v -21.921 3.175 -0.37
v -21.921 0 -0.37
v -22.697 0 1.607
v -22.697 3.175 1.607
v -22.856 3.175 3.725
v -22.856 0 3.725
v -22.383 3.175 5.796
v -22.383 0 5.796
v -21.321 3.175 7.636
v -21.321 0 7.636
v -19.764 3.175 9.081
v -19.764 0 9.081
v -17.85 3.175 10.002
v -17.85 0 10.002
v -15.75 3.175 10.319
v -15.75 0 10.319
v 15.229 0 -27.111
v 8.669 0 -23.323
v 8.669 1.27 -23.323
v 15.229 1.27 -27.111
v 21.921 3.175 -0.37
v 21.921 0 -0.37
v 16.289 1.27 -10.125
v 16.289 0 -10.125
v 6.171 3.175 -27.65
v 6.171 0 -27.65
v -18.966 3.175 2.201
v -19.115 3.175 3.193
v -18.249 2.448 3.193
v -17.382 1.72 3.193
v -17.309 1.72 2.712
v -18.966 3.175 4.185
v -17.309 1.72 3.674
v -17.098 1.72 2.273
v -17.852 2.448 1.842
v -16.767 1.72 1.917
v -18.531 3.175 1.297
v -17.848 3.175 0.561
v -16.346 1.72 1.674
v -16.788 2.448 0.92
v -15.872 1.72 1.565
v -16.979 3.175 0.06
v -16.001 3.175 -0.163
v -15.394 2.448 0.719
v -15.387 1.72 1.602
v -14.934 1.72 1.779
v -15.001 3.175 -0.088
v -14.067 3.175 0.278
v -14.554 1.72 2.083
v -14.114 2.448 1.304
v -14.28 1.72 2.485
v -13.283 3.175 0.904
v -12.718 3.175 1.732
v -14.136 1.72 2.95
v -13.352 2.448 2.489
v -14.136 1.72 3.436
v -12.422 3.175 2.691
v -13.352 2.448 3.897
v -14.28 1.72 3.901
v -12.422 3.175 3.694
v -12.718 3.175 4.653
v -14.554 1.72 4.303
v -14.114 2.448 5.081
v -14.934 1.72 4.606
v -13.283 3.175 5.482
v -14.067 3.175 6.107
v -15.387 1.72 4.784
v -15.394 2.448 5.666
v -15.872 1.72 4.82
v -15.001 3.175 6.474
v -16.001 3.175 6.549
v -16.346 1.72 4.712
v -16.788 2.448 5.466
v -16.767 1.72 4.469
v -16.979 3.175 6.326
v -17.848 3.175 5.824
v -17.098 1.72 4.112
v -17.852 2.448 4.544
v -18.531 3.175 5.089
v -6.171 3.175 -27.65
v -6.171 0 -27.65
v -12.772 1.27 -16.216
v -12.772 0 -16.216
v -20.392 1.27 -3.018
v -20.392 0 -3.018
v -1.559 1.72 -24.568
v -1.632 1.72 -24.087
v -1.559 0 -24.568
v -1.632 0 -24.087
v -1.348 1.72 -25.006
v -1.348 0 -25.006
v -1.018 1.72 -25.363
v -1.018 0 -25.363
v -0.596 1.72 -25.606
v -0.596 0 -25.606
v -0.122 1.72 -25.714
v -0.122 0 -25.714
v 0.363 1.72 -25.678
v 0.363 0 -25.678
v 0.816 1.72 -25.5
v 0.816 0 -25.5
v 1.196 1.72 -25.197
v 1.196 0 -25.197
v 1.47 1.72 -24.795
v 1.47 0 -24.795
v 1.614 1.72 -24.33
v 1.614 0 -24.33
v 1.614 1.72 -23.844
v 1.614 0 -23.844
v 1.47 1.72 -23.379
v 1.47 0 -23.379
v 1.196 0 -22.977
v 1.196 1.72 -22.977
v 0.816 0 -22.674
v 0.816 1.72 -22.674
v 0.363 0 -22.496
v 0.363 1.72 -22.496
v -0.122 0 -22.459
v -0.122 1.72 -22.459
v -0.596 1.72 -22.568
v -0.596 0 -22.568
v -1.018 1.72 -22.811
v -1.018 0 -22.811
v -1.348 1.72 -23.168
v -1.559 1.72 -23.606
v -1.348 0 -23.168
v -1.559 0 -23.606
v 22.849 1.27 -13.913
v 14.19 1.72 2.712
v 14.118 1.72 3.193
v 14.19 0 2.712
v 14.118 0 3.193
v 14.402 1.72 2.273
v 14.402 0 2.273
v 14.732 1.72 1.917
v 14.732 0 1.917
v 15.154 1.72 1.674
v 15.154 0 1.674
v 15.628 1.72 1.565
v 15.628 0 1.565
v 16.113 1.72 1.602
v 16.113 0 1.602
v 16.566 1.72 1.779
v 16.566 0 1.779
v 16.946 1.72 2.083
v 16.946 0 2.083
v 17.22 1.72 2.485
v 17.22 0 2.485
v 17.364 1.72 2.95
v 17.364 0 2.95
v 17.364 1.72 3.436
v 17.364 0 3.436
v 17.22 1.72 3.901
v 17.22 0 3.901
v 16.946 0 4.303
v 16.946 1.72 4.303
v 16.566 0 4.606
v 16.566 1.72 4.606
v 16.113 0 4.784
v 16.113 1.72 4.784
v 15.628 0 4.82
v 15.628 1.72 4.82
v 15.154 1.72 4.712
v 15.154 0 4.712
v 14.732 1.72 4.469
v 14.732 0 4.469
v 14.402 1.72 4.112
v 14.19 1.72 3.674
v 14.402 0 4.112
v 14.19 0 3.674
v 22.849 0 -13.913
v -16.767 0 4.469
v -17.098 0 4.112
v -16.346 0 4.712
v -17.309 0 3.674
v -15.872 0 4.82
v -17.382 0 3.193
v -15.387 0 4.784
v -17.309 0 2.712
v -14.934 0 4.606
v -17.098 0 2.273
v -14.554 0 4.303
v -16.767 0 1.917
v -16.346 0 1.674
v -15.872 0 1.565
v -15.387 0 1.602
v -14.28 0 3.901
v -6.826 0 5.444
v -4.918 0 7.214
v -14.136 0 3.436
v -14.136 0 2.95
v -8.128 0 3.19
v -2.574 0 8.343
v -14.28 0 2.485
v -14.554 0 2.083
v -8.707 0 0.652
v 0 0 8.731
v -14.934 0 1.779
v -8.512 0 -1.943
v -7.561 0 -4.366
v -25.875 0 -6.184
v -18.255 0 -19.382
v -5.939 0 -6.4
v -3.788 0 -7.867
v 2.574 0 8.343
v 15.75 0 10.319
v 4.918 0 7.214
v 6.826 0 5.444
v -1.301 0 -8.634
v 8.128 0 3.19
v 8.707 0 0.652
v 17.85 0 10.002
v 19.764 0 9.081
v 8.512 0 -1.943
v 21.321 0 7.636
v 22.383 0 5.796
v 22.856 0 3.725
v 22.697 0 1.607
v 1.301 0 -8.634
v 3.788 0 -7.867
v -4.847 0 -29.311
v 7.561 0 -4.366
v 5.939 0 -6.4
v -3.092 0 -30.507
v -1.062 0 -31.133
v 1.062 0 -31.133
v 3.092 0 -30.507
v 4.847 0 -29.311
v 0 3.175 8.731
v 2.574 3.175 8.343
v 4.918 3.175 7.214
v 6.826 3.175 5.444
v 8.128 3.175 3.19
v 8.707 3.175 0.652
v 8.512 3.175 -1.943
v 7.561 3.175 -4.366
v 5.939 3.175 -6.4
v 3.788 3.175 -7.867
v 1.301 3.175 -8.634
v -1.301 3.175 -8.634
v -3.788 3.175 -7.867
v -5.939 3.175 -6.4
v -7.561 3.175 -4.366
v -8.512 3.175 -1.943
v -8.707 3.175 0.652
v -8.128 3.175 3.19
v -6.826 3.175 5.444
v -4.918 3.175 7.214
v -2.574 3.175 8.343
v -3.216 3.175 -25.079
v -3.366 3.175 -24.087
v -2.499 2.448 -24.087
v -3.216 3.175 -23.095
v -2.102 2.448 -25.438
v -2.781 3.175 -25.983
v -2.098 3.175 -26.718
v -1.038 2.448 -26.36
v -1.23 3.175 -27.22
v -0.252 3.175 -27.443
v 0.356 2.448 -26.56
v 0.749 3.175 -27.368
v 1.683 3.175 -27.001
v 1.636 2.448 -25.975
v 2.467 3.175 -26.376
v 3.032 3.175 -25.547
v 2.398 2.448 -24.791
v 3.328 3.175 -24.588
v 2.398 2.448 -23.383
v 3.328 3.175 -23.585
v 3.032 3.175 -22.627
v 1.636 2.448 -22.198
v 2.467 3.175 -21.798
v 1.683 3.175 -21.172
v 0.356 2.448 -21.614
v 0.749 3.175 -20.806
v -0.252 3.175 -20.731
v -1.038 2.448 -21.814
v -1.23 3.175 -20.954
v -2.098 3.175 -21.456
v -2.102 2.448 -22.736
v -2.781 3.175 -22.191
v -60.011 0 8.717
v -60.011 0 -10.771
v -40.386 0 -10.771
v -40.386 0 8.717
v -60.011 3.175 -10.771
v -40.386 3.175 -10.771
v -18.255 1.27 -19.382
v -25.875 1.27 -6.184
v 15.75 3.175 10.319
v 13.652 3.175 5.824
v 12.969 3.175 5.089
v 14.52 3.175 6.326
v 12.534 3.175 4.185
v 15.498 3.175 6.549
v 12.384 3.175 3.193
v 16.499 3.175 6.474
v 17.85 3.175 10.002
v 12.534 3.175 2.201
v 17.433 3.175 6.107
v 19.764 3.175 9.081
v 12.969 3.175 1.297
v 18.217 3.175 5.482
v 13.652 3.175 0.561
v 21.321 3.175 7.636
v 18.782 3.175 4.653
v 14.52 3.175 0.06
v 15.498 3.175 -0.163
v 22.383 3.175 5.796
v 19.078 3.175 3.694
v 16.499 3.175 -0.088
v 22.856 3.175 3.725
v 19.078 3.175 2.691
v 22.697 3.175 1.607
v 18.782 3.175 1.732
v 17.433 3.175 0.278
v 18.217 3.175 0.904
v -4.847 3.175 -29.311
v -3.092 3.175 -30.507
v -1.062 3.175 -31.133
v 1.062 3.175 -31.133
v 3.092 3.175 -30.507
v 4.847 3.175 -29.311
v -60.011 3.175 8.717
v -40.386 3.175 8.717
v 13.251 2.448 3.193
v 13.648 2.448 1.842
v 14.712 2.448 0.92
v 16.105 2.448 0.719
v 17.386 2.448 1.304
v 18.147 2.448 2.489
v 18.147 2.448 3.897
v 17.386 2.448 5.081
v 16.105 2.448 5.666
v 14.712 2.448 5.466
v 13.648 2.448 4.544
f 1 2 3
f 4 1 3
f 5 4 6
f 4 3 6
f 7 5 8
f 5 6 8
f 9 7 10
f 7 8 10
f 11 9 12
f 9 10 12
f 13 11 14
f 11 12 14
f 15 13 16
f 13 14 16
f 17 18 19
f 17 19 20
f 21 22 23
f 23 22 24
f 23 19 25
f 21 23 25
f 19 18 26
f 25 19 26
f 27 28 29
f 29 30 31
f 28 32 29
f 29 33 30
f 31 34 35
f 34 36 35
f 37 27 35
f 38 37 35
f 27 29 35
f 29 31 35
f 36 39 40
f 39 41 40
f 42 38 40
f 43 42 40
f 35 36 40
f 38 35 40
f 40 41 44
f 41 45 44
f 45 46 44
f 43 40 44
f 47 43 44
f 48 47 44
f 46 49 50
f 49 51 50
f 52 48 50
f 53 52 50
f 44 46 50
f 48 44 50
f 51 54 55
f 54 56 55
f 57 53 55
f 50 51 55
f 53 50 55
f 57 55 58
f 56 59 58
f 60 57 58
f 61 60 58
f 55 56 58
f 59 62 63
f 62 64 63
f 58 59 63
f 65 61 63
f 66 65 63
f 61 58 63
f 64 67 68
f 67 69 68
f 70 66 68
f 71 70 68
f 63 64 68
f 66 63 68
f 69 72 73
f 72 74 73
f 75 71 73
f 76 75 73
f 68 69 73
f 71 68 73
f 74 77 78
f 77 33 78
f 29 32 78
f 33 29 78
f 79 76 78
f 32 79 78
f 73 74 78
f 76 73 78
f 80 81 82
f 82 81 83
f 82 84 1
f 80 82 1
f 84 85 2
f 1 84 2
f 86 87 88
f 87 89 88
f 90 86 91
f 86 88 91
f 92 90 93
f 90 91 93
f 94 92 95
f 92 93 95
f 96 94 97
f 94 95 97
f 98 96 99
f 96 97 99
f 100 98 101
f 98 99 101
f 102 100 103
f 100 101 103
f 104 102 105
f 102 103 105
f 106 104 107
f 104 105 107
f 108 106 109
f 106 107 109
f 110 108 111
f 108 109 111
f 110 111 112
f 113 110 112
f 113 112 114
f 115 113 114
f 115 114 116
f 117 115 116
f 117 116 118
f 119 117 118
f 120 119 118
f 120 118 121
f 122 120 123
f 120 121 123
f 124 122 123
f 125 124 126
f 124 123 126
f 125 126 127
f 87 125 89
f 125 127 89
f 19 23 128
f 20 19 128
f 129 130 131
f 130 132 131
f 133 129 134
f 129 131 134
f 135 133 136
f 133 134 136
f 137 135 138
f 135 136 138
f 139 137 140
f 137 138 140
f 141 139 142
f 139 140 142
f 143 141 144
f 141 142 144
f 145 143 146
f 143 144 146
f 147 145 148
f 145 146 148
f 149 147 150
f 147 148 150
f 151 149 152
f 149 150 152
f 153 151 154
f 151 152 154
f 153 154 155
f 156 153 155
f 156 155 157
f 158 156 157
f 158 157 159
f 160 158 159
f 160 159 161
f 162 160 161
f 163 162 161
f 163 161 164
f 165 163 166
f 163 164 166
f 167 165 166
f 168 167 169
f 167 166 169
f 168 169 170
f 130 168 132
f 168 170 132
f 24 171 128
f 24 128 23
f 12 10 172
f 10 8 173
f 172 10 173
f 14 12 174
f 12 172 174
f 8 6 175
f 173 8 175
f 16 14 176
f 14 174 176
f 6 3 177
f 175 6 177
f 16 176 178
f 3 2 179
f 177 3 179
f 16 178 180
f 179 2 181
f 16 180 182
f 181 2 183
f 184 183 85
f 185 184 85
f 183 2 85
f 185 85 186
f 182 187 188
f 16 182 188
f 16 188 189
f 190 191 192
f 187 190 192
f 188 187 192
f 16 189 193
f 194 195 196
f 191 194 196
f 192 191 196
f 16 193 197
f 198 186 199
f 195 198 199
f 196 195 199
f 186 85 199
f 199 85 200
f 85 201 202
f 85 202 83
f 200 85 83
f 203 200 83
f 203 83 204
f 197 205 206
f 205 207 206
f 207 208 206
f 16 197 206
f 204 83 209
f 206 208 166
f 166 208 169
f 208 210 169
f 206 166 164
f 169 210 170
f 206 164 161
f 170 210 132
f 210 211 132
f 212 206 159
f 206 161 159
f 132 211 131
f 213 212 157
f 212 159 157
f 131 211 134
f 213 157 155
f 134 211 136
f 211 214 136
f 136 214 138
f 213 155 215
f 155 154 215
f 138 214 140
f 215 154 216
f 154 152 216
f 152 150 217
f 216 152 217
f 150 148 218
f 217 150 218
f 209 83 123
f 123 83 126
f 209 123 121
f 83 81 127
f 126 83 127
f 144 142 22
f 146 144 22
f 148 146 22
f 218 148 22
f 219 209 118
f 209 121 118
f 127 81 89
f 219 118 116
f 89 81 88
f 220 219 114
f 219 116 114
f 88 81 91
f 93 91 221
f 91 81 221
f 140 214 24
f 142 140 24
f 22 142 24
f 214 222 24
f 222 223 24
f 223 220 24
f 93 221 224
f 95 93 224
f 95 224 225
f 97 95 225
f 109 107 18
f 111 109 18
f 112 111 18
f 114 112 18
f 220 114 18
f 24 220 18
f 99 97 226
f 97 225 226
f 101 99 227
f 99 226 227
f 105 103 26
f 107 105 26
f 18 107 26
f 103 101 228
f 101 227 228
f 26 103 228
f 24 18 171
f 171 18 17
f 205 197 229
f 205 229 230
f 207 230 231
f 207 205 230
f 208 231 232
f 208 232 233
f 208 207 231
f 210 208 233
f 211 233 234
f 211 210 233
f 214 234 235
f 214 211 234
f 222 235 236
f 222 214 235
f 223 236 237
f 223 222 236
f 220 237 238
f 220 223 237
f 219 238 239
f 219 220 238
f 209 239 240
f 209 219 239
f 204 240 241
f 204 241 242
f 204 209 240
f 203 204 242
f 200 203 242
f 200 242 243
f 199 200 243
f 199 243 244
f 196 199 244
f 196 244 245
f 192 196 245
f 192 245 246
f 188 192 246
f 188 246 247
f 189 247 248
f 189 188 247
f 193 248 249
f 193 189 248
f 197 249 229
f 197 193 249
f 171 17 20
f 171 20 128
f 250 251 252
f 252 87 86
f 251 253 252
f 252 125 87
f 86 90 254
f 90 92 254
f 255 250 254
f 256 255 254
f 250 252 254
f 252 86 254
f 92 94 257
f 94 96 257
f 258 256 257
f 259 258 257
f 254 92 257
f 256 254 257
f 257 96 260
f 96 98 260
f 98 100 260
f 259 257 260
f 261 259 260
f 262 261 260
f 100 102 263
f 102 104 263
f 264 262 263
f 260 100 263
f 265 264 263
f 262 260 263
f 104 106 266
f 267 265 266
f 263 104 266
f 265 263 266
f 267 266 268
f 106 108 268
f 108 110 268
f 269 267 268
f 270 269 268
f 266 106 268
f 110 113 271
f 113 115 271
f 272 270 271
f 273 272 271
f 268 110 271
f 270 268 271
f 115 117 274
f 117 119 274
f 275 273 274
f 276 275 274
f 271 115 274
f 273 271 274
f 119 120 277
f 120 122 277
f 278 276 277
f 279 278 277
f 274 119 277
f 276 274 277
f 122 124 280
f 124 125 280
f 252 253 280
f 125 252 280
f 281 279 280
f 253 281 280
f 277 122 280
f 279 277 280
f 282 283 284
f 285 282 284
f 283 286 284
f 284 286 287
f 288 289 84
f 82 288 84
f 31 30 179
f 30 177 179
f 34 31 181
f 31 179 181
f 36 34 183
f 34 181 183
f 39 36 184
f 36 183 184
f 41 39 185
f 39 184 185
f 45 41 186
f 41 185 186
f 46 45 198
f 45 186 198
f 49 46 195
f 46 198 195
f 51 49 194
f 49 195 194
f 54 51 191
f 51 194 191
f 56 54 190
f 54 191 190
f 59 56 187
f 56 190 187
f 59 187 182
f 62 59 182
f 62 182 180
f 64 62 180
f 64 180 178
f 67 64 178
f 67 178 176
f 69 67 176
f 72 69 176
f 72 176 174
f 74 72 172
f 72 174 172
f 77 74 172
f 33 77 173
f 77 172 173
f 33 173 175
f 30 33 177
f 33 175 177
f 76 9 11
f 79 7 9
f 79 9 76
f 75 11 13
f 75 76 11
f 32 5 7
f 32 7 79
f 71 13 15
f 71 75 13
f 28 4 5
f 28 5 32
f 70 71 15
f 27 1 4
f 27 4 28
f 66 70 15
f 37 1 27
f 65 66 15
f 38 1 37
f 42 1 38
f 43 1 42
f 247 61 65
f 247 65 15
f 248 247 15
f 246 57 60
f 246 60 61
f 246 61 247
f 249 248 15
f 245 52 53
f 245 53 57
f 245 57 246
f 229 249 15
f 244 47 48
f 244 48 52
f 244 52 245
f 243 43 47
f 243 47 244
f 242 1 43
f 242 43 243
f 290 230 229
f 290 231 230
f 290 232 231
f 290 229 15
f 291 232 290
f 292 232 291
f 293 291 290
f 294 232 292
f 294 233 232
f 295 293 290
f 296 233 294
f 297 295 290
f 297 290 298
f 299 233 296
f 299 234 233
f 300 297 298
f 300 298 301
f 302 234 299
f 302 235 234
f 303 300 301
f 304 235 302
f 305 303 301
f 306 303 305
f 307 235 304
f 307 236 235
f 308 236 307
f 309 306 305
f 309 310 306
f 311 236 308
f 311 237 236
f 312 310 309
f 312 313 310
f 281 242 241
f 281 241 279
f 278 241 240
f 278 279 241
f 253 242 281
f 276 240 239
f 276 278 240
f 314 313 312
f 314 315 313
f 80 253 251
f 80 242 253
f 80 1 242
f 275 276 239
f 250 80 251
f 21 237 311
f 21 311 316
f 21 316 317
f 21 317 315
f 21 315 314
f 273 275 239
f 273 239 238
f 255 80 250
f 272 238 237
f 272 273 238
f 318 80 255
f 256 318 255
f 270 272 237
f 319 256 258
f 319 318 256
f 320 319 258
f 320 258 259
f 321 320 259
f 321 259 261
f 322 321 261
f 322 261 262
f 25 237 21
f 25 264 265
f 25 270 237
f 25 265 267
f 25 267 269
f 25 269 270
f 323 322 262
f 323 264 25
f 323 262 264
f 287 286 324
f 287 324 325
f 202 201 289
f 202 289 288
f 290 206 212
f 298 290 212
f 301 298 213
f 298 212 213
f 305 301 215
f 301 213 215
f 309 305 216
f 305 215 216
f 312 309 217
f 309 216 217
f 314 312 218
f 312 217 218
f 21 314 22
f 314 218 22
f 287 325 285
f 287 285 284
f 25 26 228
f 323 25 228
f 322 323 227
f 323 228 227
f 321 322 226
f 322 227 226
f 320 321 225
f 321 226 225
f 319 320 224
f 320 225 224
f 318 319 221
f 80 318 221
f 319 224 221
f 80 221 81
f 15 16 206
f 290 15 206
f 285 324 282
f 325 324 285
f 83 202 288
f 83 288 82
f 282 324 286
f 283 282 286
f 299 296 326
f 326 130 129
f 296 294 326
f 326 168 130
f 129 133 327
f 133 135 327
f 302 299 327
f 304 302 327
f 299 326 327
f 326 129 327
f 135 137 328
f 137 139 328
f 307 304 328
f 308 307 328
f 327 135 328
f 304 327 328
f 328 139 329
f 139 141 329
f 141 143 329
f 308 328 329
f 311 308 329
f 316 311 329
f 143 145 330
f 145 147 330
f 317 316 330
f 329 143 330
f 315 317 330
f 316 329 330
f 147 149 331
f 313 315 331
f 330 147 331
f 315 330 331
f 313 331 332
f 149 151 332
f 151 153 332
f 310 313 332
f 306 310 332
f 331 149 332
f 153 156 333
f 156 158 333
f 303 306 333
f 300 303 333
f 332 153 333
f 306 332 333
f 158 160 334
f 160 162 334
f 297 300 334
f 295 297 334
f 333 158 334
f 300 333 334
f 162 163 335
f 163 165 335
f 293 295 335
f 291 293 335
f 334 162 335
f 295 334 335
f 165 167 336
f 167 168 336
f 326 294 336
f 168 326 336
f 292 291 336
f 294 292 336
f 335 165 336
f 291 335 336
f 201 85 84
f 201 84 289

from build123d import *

# Parameters (mm, degrees)
SKETCH1_R                                         = 8.73125
BOSS_EXTRUDE1_DEPTH                               = 3.175
CSK_FOR_4_FLAT_HEAD_MACHINE_SCREW_100_D           = 3.2639
CSK_FOR_4_FLAT_HEAD_MACHINE_SCREW_100_CSINK_D     = 6.731
CSK_FOR_4_FLAT_HEAD_MACHINE_SCREW_100_CSINK_ANGLE = 100
SKETCH6_W                                         = 19.624756389
SKETCH6_H                                         = 19.488189804
BOSS_EXTRUDE2_DEPTH                               = 3.175
BOSS_EXTRUDE3_DEPTH                               = 1.27


with BuildPart() as part:
    # Sketch1 → Boss-Extrude1 (new body)
    with BuildSketch(Plane(origin=(0, 0, 0), x_dir=(1, 0, 0), z_dir=(0, 1, 0))):
        with BuildLine():
            Line((-6.171314161, 27.649879676), (-21.921198564, 0.370279676))
            ThreePointArc((-21.921198564, 0.370279676), (-21.921198564, -6.755740108), (-15.749884403, -10.31875))
            Line((-15.749884403, -10.31875), (15.749884403, -10.31875))
            ThreePointArc((15.749884403, -10.31875), (21.921198564, -6.755740108), (21.921198564, 0.370279676))
            Line((21.921198564, 0.370279676), (6.171314161, 27.649879676))
            ThreePointArc((6.171314161, 27.649879676), (0, 31.212889568), (-6.171314161, 27.649879676))
        make_face()
        with Locations(Location((0, 0, 0), (0, 0, 270))):
            Circle(SKETCH1_R, mode=Mode.SUBTRACT)
    extrude(amount=BOSS_EXTRUDE1_DEPTH)

    # CSK for #4 Flat Head Machine Screw (100)1 (through all)
    with Locations(Plane(origin=(0, 3.175, 0), x_dir=(1, 0, 0), z_dir=(0, 1, 0))):
        with Locations((0, 24.086869784), (-15.749884403, -3.192730216), (15.749884403, -3.192730216)):
            CounterSinkHole(CSK_FOR_4_FLAT_HEAD_MACHINE_SCREW_100_D / 2, CSK_FOR_4_FLAT_HEAD_MACHINE_SCREW_100_CSINK_D / 2, counter_sink_angle=CSK_FOR_4_FLAT_HEAD_MACHINE_SCREW_100_CSINK_ANGLE)

    # Sketch7 → Boss-Extrude3 (add)
    with BuildSketch(Plane.XZ):
        Polygon((16.289215205, -10.125161001), (8.669215205, -23.323388155), (15.229176289, -27.110783453), (22.849176289, -13.912556299), align=None)
        Polygon((-12.772453659, -16.216370676), (-20.392453659, -3.018143523), (-25.87549158, -6.183776942), (-18.25549158, -19.382004096), align=None)
    extrude(amount=-BOSS_EXTRUDE3_DEPTH)


with BuildPart() as body_2:
    # Sketch6 → Boss-Extrude2 (new body)
    with BuildSketch(Plane(origin=(0, 3.175, 0), x_dir=(1, 0, 0), z_dir=(0, 1, 0))):
        with Locations((-50.198654317, 1.027139445)):
            Rectangle(SKETCH6_W, SKETCH6_H)
    extrude(amount=-BOSS_EXTRUDE2_DEPTH)


solid = Compound([part.part, body_2.part])
